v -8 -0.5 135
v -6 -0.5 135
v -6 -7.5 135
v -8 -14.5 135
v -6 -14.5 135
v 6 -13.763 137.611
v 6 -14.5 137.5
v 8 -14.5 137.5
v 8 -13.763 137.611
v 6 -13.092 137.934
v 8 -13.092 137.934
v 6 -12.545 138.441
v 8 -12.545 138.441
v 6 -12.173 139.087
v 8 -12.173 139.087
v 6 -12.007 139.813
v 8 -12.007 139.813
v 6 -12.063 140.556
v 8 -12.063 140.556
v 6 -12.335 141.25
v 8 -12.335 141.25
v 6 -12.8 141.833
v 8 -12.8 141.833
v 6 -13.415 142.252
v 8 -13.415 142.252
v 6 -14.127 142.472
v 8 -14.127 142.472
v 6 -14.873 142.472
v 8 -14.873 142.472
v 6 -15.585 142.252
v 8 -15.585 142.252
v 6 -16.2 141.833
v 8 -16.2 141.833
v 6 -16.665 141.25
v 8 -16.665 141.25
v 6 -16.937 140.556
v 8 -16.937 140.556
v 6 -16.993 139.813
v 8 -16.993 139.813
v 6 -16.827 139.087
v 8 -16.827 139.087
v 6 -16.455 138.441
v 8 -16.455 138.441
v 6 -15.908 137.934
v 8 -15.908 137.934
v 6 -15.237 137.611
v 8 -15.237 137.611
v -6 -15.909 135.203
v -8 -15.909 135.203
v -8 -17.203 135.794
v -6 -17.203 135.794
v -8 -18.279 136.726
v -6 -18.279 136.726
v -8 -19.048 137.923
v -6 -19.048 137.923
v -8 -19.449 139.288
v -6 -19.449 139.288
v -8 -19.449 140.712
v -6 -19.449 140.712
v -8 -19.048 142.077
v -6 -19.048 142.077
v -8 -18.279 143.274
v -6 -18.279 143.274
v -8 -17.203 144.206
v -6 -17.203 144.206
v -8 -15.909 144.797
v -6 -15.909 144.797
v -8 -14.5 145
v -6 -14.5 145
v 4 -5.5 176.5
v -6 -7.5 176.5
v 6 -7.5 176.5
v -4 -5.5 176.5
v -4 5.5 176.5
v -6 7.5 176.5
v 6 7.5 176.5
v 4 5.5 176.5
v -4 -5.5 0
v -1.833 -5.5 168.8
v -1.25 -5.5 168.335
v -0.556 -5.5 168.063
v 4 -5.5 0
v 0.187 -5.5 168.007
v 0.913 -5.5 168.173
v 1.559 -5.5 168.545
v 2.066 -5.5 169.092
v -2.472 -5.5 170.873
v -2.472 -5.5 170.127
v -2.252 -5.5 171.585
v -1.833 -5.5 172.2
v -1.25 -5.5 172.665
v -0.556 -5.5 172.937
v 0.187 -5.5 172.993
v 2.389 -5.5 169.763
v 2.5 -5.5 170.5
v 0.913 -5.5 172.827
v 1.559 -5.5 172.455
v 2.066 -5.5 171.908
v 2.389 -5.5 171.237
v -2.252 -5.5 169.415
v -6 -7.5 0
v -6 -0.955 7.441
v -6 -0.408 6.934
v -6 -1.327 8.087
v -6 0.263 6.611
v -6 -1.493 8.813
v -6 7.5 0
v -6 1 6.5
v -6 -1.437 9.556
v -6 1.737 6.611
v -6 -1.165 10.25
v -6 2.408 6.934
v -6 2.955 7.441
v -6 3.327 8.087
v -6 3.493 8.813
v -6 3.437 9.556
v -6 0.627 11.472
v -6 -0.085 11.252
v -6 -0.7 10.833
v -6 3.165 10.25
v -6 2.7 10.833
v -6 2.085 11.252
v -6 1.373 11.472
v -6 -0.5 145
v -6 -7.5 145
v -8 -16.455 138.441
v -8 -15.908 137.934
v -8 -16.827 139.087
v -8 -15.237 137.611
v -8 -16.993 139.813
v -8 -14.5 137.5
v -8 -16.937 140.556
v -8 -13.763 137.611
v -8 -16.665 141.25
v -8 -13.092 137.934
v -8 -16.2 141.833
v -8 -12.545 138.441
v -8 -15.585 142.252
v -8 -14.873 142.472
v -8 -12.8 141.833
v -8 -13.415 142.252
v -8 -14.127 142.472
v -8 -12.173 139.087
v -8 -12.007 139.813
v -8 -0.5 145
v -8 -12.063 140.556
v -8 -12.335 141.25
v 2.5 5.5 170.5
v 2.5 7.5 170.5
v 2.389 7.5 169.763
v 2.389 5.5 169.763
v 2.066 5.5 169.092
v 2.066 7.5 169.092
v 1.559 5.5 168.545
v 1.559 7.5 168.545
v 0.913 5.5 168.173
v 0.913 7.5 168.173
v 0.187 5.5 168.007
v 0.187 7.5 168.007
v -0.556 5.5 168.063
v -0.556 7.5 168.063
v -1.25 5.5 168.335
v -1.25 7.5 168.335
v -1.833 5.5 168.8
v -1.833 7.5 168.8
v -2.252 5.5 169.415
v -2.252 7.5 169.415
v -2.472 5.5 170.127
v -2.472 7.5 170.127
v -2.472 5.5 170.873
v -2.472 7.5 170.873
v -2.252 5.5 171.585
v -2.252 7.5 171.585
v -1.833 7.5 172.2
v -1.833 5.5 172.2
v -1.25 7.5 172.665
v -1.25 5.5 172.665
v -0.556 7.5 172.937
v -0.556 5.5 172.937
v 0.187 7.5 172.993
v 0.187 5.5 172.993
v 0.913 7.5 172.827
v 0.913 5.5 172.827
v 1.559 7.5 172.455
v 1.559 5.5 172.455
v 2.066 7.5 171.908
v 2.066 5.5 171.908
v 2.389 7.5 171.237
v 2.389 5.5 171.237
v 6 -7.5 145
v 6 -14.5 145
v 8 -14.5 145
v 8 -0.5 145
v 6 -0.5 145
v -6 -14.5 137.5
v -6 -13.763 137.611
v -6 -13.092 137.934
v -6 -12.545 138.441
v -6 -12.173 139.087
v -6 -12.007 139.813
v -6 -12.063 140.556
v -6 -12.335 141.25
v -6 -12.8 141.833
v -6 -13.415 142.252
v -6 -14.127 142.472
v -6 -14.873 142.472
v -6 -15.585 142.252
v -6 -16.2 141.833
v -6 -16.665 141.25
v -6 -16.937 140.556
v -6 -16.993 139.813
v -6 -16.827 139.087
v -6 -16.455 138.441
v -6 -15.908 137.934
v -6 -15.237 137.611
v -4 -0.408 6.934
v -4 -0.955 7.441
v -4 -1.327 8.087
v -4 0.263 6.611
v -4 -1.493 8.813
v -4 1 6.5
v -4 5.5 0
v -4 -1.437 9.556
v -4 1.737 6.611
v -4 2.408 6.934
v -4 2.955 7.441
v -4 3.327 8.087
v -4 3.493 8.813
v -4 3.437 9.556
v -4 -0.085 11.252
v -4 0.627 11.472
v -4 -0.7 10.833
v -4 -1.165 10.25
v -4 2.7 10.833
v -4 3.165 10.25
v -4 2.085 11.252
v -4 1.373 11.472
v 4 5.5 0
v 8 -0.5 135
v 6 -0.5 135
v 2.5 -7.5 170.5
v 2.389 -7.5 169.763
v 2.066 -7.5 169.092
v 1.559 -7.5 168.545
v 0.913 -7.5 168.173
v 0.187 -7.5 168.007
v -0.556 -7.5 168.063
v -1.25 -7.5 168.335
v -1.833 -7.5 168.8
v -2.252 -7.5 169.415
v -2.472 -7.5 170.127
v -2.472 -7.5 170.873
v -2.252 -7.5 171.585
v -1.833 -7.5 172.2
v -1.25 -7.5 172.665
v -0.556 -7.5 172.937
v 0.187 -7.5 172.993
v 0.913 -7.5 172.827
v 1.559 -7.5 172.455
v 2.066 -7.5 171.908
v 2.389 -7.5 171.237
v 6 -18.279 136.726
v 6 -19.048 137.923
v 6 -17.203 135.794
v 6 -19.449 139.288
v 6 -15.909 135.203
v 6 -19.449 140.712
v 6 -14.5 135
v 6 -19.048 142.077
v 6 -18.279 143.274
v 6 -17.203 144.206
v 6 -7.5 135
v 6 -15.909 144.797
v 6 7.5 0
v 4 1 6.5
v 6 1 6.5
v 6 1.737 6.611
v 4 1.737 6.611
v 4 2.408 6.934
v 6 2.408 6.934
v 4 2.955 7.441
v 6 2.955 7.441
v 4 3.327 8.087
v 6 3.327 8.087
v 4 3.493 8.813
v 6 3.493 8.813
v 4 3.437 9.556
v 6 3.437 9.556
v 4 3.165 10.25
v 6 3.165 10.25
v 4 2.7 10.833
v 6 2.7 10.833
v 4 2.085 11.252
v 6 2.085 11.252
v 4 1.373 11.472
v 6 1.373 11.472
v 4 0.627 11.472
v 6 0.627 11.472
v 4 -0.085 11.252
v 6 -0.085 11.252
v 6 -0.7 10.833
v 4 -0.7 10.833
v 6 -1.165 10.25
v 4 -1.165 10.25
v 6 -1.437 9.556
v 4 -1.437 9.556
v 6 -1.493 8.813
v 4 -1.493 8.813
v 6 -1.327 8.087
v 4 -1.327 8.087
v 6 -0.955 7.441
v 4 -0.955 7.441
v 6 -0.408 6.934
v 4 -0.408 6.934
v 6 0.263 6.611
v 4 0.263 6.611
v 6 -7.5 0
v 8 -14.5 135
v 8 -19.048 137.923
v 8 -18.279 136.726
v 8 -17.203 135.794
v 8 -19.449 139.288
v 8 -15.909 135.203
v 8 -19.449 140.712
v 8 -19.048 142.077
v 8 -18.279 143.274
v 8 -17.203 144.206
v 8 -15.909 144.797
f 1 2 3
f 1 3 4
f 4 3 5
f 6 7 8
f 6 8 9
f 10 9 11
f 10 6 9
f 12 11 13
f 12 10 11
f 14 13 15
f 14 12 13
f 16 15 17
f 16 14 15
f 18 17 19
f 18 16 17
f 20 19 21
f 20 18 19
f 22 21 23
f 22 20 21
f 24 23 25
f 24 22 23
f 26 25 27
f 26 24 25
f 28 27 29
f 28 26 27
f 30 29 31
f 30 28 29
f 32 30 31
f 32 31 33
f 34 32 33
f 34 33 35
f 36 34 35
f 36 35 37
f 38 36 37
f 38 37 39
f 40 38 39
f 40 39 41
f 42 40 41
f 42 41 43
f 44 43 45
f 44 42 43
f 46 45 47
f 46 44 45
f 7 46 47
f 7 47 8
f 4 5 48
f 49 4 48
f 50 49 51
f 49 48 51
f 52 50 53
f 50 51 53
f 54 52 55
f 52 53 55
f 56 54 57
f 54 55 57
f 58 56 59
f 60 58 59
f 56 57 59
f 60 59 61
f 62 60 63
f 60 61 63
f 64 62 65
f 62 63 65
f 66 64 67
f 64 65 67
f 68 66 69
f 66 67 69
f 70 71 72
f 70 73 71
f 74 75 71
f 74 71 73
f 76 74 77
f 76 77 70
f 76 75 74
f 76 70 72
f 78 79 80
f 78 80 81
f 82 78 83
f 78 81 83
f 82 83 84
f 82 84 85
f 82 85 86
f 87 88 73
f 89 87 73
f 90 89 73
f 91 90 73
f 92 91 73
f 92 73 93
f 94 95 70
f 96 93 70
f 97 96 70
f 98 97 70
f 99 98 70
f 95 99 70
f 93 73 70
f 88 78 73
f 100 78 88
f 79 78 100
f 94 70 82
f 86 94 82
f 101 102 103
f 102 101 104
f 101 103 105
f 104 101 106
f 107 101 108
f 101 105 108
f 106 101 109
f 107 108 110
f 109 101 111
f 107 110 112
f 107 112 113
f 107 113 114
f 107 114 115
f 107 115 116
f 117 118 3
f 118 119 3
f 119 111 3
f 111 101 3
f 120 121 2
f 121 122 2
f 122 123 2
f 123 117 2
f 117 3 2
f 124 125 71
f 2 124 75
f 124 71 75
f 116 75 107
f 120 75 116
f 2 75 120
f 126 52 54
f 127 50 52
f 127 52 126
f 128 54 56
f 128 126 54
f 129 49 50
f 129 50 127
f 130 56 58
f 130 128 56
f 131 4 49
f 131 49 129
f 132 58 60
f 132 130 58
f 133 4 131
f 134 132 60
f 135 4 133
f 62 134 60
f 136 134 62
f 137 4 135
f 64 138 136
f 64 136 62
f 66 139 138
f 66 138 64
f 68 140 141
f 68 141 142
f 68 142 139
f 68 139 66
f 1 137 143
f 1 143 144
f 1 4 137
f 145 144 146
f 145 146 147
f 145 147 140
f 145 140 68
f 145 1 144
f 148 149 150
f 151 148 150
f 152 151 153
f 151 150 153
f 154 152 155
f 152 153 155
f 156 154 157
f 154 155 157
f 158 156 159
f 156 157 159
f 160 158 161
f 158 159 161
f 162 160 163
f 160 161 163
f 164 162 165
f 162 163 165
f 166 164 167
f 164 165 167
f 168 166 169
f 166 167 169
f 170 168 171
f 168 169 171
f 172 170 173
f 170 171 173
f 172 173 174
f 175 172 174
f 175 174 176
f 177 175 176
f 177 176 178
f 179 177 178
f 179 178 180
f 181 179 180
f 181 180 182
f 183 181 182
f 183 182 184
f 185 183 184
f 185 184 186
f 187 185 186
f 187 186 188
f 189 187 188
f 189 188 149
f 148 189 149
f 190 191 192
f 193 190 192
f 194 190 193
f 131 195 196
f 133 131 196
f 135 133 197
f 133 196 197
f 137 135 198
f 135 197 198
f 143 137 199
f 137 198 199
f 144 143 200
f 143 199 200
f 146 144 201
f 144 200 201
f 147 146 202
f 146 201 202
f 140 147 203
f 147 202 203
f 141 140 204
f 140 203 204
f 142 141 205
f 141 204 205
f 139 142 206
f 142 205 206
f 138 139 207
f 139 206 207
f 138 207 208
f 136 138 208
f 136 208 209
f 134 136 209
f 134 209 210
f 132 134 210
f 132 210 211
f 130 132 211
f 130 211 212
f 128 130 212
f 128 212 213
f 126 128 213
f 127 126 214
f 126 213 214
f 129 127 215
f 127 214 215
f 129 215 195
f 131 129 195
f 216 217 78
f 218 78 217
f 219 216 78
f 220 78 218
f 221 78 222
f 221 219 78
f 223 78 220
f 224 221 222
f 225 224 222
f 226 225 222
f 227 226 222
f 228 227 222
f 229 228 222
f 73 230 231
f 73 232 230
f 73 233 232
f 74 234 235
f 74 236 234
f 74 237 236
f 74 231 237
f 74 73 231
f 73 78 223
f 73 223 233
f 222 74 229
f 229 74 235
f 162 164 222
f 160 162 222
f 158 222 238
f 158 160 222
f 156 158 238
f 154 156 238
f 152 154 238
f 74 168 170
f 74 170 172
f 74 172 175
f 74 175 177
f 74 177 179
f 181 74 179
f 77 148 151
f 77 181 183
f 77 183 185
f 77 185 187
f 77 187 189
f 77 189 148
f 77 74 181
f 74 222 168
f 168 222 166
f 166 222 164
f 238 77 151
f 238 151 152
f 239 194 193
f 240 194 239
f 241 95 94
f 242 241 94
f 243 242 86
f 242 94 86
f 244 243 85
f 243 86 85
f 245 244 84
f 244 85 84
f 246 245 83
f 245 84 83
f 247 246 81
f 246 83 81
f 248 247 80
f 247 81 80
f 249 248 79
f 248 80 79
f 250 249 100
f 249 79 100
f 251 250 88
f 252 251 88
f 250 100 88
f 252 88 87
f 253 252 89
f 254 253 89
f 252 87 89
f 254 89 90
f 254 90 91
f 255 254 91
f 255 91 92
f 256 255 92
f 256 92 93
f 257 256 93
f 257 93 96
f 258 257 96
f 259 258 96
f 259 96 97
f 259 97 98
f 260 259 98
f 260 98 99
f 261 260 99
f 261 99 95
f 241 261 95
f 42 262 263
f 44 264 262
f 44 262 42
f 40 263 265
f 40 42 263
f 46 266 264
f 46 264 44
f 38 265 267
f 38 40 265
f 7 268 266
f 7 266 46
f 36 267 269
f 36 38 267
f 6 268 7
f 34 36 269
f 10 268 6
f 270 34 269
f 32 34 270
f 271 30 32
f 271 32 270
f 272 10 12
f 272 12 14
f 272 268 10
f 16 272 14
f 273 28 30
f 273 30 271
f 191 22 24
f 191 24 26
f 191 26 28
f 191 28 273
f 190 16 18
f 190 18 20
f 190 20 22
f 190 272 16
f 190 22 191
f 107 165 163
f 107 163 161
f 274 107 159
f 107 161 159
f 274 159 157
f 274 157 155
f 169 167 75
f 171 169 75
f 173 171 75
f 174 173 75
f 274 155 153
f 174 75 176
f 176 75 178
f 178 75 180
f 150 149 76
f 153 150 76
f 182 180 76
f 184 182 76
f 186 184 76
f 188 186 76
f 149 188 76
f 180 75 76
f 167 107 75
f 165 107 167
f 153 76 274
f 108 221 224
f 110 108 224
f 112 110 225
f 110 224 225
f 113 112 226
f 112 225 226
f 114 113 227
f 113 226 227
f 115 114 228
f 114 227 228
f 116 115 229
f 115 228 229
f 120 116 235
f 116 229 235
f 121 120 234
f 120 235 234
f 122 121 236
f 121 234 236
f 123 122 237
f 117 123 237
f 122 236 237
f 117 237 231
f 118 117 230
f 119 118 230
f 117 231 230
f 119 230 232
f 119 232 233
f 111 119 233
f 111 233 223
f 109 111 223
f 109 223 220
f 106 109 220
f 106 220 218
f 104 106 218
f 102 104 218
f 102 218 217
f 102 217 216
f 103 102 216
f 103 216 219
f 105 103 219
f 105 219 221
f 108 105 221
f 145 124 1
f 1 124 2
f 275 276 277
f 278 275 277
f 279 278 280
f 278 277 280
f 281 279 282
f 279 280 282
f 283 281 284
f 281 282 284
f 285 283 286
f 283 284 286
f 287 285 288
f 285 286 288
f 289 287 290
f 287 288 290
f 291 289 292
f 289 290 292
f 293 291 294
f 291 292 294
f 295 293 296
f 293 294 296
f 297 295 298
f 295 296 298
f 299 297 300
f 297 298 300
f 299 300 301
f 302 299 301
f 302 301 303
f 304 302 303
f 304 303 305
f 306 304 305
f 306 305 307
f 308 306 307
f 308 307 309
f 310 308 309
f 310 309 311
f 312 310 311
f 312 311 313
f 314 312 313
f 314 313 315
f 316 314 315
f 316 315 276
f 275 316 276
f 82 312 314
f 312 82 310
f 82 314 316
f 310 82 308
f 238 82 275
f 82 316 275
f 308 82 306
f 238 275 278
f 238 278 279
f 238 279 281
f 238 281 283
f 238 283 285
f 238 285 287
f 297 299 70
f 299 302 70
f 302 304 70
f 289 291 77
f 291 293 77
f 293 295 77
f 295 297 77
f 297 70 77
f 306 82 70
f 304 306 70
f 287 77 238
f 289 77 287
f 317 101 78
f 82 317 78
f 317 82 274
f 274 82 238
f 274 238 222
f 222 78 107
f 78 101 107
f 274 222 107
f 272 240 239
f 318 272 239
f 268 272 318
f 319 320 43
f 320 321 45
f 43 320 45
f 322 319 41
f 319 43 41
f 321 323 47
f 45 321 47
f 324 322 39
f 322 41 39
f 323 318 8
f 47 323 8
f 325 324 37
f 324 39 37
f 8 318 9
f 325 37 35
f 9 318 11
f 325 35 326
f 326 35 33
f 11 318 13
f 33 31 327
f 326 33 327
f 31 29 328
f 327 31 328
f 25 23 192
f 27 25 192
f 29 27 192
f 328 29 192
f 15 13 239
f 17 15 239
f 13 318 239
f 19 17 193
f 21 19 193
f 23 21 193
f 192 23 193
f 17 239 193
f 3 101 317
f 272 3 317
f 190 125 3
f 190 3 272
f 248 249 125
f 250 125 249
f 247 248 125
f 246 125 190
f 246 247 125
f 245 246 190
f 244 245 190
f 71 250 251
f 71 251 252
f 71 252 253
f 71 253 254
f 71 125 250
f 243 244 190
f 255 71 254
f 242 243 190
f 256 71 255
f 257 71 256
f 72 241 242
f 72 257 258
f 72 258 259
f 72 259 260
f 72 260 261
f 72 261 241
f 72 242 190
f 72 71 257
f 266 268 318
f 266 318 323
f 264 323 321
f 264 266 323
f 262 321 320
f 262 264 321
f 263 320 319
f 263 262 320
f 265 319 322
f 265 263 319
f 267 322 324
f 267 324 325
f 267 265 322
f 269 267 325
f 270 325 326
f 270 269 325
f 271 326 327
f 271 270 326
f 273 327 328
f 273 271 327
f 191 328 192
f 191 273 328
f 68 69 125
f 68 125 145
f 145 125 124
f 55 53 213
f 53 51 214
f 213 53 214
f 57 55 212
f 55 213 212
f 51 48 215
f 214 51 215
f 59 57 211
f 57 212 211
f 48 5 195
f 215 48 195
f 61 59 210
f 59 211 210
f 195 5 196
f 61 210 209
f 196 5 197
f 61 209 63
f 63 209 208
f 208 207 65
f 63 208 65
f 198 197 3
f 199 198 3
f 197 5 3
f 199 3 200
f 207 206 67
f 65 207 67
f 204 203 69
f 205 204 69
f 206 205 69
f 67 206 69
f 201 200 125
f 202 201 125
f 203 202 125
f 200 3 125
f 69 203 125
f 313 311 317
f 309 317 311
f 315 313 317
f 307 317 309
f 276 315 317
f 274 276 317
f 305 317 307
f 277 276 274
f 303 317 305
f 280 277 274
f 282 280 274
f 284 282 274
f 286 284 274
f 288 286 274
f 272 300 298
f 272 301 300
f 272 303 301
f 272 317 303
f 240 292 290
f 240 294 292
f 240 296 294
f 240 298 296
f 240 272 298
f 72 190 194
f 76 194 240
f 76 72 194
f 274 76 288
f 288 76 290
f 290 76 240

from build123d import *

# Parameters (mm, degrees)
CROQUIS1_W                = 12
CROQUIS1_H                = 15
CROQUIS1_W_2              = 8
CROQUIS1_H_2              = 11
SALIENTE_EXTRUIR1_DEPTH   = 176.5
CROQUIS3_R                = 2.5
SALIENTE_EXTRUIR2_DEPTH   = 2
SIMETR_A2_COPY_1_SKETCH_R = 2.5
SIMETR_A2_COPY_1_DEPTH    = 2
SKETCH1_R                 = 2.5
CUT_EXTRUDE1_DEPTH        = 28
SKETCH6_W                 = 176.5
SKETCH6_H                 = 30.622513857
CUT_EXTRUDE2_DEPTH        = 15
SKETCH7_W                 = 10
SKETCH7_H                 = 20.073339824
CUT_EXTRUDE3_DEPTH        = 10
SKETCH8_R                 = 2.5
CUT_EXTRUDE4_DEPTH        = 15


with BuildPart() as part:
    # Croquis1 → Saliente-Extruir1 (new body, symmetric)
    with BuildSketch(Plane.XY):
        Rectangle(CROQUIS1_W, CROQUIS1_H)
        Rectangle(CROQUIS1_W_2, CROQUIS1_H_2, mode=Mode.SUBTRACT)
    extrude(amount=SALIENTE_EXTRUIR1_DEPTH, both=True)

    # Croquis3 → Saliente-Extruir2 (add)
    with BuildSketch(Plane.ZY.offset(6)):
        with BuildLine():
            Line((-145, -14.5), (-145, -0.5))
            Line((-145, -0.5), (-135, -0.5))
            Line((-135, -0.5), (-135, -14.5))
            ThreePointArc((-135, -14.5), (-140, -19.5), (-145, -14.5))
        make_face()
        with Locations((-140, -14.5)):
            Circle(CROQUIS3_R, mode=Mode.SUBTRACT)
    saliente_extruir2 = extrude(amount=SALIENTE_EXTRUIR2_DEPTH)

    # Simetría1: Saliente-Extruir2 across plane
    add(saliente_extruir2.mirror(Plane(origin=(0, 0, 0), x_dir=(0, 0, 1), z_dir=(1, 0, 0))))

    # Simetría2: Saliente-Extruir2 across plane
    add(saliente_extruir2.mirror(Plane.XY))

    # Simetría2 copy 1 sketch → Simetría2 copy 1 (add)
    with BuildSketch(Plane(origin=(6, 0, 0), x_dir=(0, 0, -1), z_dir=(1, 0, 0))):
        with BuildLine():
            Line((-145, -14.5), (-145, -0.5))
            Line((-145, -0.5), (-135, -0.5))
            Line((-135, -0.5), (-135, -14.5))
            ThreePointArc((-135, -14.5), (-140, -19.5), (-145, -14.5))
        make_face()
        with Locations((-140, -14.5)):
            Circle(SIMETR_A2_COPY_1_SKETCH_R, mode=Mode.SUBTRACT)
    extrude(amount=SIMETR_A2_COPY_1_DEPTH)

    # Sketch1 → Cut-Extrude1 (cut, through all)
    with BuildSketch(Plane(origin=(0, 7.5, 0), x_dir=(1, 0, 0), z_dir=(0, 1, 0))):
        with Locations((0, 170.5)):
            Circle(SKETCH1_R)
        with Locations((0, -170.5)):
            Circle(SKETCH1_R)
    extrude(amount=-CUT_EXTRUDE1_DEPTH, mode=Mode.SUBTRACT)

    # Sketch6 → Cut-Extrude2 (cut, through all)
    with BuildSketch(Plane.ZY.offset(6)):
        with Locations((-88.25, -7.811256929)):
            Rectangle(SKETCH6_W, SKETCH6_H)
    extrude(amount=-CUT_EXTRUDE2_DEPTH, mode=Mode.SUBTRACT)

    # Sketch7 → Cut-Extrude3 (cut)
    with BuildSketch(Plane.ZY.offset(8)):
        with Locations((-140, -10.536669912)):
            Rectangle(SKETCH7_W, SKETCH7_H)
    extrude(amount=-CUT_EXTRUDE3_DEPTH, mode=Mode.SUBTRACT)

    # Sketch8 → Cut-Extrude4 (cut, through all)
    with BuildSketch(Plane(origin=(6, 0, 0), x_dir=(0, 0, -1), z_dir=(1, 0, 0))):
        with Locations((-9, 1)):
            Circle(SKETCH8_R)
    extrude(amount=-CUT_EXTRUDE4_DEPTH, mode=Mode.SUBTRACT)


solid = part.part
